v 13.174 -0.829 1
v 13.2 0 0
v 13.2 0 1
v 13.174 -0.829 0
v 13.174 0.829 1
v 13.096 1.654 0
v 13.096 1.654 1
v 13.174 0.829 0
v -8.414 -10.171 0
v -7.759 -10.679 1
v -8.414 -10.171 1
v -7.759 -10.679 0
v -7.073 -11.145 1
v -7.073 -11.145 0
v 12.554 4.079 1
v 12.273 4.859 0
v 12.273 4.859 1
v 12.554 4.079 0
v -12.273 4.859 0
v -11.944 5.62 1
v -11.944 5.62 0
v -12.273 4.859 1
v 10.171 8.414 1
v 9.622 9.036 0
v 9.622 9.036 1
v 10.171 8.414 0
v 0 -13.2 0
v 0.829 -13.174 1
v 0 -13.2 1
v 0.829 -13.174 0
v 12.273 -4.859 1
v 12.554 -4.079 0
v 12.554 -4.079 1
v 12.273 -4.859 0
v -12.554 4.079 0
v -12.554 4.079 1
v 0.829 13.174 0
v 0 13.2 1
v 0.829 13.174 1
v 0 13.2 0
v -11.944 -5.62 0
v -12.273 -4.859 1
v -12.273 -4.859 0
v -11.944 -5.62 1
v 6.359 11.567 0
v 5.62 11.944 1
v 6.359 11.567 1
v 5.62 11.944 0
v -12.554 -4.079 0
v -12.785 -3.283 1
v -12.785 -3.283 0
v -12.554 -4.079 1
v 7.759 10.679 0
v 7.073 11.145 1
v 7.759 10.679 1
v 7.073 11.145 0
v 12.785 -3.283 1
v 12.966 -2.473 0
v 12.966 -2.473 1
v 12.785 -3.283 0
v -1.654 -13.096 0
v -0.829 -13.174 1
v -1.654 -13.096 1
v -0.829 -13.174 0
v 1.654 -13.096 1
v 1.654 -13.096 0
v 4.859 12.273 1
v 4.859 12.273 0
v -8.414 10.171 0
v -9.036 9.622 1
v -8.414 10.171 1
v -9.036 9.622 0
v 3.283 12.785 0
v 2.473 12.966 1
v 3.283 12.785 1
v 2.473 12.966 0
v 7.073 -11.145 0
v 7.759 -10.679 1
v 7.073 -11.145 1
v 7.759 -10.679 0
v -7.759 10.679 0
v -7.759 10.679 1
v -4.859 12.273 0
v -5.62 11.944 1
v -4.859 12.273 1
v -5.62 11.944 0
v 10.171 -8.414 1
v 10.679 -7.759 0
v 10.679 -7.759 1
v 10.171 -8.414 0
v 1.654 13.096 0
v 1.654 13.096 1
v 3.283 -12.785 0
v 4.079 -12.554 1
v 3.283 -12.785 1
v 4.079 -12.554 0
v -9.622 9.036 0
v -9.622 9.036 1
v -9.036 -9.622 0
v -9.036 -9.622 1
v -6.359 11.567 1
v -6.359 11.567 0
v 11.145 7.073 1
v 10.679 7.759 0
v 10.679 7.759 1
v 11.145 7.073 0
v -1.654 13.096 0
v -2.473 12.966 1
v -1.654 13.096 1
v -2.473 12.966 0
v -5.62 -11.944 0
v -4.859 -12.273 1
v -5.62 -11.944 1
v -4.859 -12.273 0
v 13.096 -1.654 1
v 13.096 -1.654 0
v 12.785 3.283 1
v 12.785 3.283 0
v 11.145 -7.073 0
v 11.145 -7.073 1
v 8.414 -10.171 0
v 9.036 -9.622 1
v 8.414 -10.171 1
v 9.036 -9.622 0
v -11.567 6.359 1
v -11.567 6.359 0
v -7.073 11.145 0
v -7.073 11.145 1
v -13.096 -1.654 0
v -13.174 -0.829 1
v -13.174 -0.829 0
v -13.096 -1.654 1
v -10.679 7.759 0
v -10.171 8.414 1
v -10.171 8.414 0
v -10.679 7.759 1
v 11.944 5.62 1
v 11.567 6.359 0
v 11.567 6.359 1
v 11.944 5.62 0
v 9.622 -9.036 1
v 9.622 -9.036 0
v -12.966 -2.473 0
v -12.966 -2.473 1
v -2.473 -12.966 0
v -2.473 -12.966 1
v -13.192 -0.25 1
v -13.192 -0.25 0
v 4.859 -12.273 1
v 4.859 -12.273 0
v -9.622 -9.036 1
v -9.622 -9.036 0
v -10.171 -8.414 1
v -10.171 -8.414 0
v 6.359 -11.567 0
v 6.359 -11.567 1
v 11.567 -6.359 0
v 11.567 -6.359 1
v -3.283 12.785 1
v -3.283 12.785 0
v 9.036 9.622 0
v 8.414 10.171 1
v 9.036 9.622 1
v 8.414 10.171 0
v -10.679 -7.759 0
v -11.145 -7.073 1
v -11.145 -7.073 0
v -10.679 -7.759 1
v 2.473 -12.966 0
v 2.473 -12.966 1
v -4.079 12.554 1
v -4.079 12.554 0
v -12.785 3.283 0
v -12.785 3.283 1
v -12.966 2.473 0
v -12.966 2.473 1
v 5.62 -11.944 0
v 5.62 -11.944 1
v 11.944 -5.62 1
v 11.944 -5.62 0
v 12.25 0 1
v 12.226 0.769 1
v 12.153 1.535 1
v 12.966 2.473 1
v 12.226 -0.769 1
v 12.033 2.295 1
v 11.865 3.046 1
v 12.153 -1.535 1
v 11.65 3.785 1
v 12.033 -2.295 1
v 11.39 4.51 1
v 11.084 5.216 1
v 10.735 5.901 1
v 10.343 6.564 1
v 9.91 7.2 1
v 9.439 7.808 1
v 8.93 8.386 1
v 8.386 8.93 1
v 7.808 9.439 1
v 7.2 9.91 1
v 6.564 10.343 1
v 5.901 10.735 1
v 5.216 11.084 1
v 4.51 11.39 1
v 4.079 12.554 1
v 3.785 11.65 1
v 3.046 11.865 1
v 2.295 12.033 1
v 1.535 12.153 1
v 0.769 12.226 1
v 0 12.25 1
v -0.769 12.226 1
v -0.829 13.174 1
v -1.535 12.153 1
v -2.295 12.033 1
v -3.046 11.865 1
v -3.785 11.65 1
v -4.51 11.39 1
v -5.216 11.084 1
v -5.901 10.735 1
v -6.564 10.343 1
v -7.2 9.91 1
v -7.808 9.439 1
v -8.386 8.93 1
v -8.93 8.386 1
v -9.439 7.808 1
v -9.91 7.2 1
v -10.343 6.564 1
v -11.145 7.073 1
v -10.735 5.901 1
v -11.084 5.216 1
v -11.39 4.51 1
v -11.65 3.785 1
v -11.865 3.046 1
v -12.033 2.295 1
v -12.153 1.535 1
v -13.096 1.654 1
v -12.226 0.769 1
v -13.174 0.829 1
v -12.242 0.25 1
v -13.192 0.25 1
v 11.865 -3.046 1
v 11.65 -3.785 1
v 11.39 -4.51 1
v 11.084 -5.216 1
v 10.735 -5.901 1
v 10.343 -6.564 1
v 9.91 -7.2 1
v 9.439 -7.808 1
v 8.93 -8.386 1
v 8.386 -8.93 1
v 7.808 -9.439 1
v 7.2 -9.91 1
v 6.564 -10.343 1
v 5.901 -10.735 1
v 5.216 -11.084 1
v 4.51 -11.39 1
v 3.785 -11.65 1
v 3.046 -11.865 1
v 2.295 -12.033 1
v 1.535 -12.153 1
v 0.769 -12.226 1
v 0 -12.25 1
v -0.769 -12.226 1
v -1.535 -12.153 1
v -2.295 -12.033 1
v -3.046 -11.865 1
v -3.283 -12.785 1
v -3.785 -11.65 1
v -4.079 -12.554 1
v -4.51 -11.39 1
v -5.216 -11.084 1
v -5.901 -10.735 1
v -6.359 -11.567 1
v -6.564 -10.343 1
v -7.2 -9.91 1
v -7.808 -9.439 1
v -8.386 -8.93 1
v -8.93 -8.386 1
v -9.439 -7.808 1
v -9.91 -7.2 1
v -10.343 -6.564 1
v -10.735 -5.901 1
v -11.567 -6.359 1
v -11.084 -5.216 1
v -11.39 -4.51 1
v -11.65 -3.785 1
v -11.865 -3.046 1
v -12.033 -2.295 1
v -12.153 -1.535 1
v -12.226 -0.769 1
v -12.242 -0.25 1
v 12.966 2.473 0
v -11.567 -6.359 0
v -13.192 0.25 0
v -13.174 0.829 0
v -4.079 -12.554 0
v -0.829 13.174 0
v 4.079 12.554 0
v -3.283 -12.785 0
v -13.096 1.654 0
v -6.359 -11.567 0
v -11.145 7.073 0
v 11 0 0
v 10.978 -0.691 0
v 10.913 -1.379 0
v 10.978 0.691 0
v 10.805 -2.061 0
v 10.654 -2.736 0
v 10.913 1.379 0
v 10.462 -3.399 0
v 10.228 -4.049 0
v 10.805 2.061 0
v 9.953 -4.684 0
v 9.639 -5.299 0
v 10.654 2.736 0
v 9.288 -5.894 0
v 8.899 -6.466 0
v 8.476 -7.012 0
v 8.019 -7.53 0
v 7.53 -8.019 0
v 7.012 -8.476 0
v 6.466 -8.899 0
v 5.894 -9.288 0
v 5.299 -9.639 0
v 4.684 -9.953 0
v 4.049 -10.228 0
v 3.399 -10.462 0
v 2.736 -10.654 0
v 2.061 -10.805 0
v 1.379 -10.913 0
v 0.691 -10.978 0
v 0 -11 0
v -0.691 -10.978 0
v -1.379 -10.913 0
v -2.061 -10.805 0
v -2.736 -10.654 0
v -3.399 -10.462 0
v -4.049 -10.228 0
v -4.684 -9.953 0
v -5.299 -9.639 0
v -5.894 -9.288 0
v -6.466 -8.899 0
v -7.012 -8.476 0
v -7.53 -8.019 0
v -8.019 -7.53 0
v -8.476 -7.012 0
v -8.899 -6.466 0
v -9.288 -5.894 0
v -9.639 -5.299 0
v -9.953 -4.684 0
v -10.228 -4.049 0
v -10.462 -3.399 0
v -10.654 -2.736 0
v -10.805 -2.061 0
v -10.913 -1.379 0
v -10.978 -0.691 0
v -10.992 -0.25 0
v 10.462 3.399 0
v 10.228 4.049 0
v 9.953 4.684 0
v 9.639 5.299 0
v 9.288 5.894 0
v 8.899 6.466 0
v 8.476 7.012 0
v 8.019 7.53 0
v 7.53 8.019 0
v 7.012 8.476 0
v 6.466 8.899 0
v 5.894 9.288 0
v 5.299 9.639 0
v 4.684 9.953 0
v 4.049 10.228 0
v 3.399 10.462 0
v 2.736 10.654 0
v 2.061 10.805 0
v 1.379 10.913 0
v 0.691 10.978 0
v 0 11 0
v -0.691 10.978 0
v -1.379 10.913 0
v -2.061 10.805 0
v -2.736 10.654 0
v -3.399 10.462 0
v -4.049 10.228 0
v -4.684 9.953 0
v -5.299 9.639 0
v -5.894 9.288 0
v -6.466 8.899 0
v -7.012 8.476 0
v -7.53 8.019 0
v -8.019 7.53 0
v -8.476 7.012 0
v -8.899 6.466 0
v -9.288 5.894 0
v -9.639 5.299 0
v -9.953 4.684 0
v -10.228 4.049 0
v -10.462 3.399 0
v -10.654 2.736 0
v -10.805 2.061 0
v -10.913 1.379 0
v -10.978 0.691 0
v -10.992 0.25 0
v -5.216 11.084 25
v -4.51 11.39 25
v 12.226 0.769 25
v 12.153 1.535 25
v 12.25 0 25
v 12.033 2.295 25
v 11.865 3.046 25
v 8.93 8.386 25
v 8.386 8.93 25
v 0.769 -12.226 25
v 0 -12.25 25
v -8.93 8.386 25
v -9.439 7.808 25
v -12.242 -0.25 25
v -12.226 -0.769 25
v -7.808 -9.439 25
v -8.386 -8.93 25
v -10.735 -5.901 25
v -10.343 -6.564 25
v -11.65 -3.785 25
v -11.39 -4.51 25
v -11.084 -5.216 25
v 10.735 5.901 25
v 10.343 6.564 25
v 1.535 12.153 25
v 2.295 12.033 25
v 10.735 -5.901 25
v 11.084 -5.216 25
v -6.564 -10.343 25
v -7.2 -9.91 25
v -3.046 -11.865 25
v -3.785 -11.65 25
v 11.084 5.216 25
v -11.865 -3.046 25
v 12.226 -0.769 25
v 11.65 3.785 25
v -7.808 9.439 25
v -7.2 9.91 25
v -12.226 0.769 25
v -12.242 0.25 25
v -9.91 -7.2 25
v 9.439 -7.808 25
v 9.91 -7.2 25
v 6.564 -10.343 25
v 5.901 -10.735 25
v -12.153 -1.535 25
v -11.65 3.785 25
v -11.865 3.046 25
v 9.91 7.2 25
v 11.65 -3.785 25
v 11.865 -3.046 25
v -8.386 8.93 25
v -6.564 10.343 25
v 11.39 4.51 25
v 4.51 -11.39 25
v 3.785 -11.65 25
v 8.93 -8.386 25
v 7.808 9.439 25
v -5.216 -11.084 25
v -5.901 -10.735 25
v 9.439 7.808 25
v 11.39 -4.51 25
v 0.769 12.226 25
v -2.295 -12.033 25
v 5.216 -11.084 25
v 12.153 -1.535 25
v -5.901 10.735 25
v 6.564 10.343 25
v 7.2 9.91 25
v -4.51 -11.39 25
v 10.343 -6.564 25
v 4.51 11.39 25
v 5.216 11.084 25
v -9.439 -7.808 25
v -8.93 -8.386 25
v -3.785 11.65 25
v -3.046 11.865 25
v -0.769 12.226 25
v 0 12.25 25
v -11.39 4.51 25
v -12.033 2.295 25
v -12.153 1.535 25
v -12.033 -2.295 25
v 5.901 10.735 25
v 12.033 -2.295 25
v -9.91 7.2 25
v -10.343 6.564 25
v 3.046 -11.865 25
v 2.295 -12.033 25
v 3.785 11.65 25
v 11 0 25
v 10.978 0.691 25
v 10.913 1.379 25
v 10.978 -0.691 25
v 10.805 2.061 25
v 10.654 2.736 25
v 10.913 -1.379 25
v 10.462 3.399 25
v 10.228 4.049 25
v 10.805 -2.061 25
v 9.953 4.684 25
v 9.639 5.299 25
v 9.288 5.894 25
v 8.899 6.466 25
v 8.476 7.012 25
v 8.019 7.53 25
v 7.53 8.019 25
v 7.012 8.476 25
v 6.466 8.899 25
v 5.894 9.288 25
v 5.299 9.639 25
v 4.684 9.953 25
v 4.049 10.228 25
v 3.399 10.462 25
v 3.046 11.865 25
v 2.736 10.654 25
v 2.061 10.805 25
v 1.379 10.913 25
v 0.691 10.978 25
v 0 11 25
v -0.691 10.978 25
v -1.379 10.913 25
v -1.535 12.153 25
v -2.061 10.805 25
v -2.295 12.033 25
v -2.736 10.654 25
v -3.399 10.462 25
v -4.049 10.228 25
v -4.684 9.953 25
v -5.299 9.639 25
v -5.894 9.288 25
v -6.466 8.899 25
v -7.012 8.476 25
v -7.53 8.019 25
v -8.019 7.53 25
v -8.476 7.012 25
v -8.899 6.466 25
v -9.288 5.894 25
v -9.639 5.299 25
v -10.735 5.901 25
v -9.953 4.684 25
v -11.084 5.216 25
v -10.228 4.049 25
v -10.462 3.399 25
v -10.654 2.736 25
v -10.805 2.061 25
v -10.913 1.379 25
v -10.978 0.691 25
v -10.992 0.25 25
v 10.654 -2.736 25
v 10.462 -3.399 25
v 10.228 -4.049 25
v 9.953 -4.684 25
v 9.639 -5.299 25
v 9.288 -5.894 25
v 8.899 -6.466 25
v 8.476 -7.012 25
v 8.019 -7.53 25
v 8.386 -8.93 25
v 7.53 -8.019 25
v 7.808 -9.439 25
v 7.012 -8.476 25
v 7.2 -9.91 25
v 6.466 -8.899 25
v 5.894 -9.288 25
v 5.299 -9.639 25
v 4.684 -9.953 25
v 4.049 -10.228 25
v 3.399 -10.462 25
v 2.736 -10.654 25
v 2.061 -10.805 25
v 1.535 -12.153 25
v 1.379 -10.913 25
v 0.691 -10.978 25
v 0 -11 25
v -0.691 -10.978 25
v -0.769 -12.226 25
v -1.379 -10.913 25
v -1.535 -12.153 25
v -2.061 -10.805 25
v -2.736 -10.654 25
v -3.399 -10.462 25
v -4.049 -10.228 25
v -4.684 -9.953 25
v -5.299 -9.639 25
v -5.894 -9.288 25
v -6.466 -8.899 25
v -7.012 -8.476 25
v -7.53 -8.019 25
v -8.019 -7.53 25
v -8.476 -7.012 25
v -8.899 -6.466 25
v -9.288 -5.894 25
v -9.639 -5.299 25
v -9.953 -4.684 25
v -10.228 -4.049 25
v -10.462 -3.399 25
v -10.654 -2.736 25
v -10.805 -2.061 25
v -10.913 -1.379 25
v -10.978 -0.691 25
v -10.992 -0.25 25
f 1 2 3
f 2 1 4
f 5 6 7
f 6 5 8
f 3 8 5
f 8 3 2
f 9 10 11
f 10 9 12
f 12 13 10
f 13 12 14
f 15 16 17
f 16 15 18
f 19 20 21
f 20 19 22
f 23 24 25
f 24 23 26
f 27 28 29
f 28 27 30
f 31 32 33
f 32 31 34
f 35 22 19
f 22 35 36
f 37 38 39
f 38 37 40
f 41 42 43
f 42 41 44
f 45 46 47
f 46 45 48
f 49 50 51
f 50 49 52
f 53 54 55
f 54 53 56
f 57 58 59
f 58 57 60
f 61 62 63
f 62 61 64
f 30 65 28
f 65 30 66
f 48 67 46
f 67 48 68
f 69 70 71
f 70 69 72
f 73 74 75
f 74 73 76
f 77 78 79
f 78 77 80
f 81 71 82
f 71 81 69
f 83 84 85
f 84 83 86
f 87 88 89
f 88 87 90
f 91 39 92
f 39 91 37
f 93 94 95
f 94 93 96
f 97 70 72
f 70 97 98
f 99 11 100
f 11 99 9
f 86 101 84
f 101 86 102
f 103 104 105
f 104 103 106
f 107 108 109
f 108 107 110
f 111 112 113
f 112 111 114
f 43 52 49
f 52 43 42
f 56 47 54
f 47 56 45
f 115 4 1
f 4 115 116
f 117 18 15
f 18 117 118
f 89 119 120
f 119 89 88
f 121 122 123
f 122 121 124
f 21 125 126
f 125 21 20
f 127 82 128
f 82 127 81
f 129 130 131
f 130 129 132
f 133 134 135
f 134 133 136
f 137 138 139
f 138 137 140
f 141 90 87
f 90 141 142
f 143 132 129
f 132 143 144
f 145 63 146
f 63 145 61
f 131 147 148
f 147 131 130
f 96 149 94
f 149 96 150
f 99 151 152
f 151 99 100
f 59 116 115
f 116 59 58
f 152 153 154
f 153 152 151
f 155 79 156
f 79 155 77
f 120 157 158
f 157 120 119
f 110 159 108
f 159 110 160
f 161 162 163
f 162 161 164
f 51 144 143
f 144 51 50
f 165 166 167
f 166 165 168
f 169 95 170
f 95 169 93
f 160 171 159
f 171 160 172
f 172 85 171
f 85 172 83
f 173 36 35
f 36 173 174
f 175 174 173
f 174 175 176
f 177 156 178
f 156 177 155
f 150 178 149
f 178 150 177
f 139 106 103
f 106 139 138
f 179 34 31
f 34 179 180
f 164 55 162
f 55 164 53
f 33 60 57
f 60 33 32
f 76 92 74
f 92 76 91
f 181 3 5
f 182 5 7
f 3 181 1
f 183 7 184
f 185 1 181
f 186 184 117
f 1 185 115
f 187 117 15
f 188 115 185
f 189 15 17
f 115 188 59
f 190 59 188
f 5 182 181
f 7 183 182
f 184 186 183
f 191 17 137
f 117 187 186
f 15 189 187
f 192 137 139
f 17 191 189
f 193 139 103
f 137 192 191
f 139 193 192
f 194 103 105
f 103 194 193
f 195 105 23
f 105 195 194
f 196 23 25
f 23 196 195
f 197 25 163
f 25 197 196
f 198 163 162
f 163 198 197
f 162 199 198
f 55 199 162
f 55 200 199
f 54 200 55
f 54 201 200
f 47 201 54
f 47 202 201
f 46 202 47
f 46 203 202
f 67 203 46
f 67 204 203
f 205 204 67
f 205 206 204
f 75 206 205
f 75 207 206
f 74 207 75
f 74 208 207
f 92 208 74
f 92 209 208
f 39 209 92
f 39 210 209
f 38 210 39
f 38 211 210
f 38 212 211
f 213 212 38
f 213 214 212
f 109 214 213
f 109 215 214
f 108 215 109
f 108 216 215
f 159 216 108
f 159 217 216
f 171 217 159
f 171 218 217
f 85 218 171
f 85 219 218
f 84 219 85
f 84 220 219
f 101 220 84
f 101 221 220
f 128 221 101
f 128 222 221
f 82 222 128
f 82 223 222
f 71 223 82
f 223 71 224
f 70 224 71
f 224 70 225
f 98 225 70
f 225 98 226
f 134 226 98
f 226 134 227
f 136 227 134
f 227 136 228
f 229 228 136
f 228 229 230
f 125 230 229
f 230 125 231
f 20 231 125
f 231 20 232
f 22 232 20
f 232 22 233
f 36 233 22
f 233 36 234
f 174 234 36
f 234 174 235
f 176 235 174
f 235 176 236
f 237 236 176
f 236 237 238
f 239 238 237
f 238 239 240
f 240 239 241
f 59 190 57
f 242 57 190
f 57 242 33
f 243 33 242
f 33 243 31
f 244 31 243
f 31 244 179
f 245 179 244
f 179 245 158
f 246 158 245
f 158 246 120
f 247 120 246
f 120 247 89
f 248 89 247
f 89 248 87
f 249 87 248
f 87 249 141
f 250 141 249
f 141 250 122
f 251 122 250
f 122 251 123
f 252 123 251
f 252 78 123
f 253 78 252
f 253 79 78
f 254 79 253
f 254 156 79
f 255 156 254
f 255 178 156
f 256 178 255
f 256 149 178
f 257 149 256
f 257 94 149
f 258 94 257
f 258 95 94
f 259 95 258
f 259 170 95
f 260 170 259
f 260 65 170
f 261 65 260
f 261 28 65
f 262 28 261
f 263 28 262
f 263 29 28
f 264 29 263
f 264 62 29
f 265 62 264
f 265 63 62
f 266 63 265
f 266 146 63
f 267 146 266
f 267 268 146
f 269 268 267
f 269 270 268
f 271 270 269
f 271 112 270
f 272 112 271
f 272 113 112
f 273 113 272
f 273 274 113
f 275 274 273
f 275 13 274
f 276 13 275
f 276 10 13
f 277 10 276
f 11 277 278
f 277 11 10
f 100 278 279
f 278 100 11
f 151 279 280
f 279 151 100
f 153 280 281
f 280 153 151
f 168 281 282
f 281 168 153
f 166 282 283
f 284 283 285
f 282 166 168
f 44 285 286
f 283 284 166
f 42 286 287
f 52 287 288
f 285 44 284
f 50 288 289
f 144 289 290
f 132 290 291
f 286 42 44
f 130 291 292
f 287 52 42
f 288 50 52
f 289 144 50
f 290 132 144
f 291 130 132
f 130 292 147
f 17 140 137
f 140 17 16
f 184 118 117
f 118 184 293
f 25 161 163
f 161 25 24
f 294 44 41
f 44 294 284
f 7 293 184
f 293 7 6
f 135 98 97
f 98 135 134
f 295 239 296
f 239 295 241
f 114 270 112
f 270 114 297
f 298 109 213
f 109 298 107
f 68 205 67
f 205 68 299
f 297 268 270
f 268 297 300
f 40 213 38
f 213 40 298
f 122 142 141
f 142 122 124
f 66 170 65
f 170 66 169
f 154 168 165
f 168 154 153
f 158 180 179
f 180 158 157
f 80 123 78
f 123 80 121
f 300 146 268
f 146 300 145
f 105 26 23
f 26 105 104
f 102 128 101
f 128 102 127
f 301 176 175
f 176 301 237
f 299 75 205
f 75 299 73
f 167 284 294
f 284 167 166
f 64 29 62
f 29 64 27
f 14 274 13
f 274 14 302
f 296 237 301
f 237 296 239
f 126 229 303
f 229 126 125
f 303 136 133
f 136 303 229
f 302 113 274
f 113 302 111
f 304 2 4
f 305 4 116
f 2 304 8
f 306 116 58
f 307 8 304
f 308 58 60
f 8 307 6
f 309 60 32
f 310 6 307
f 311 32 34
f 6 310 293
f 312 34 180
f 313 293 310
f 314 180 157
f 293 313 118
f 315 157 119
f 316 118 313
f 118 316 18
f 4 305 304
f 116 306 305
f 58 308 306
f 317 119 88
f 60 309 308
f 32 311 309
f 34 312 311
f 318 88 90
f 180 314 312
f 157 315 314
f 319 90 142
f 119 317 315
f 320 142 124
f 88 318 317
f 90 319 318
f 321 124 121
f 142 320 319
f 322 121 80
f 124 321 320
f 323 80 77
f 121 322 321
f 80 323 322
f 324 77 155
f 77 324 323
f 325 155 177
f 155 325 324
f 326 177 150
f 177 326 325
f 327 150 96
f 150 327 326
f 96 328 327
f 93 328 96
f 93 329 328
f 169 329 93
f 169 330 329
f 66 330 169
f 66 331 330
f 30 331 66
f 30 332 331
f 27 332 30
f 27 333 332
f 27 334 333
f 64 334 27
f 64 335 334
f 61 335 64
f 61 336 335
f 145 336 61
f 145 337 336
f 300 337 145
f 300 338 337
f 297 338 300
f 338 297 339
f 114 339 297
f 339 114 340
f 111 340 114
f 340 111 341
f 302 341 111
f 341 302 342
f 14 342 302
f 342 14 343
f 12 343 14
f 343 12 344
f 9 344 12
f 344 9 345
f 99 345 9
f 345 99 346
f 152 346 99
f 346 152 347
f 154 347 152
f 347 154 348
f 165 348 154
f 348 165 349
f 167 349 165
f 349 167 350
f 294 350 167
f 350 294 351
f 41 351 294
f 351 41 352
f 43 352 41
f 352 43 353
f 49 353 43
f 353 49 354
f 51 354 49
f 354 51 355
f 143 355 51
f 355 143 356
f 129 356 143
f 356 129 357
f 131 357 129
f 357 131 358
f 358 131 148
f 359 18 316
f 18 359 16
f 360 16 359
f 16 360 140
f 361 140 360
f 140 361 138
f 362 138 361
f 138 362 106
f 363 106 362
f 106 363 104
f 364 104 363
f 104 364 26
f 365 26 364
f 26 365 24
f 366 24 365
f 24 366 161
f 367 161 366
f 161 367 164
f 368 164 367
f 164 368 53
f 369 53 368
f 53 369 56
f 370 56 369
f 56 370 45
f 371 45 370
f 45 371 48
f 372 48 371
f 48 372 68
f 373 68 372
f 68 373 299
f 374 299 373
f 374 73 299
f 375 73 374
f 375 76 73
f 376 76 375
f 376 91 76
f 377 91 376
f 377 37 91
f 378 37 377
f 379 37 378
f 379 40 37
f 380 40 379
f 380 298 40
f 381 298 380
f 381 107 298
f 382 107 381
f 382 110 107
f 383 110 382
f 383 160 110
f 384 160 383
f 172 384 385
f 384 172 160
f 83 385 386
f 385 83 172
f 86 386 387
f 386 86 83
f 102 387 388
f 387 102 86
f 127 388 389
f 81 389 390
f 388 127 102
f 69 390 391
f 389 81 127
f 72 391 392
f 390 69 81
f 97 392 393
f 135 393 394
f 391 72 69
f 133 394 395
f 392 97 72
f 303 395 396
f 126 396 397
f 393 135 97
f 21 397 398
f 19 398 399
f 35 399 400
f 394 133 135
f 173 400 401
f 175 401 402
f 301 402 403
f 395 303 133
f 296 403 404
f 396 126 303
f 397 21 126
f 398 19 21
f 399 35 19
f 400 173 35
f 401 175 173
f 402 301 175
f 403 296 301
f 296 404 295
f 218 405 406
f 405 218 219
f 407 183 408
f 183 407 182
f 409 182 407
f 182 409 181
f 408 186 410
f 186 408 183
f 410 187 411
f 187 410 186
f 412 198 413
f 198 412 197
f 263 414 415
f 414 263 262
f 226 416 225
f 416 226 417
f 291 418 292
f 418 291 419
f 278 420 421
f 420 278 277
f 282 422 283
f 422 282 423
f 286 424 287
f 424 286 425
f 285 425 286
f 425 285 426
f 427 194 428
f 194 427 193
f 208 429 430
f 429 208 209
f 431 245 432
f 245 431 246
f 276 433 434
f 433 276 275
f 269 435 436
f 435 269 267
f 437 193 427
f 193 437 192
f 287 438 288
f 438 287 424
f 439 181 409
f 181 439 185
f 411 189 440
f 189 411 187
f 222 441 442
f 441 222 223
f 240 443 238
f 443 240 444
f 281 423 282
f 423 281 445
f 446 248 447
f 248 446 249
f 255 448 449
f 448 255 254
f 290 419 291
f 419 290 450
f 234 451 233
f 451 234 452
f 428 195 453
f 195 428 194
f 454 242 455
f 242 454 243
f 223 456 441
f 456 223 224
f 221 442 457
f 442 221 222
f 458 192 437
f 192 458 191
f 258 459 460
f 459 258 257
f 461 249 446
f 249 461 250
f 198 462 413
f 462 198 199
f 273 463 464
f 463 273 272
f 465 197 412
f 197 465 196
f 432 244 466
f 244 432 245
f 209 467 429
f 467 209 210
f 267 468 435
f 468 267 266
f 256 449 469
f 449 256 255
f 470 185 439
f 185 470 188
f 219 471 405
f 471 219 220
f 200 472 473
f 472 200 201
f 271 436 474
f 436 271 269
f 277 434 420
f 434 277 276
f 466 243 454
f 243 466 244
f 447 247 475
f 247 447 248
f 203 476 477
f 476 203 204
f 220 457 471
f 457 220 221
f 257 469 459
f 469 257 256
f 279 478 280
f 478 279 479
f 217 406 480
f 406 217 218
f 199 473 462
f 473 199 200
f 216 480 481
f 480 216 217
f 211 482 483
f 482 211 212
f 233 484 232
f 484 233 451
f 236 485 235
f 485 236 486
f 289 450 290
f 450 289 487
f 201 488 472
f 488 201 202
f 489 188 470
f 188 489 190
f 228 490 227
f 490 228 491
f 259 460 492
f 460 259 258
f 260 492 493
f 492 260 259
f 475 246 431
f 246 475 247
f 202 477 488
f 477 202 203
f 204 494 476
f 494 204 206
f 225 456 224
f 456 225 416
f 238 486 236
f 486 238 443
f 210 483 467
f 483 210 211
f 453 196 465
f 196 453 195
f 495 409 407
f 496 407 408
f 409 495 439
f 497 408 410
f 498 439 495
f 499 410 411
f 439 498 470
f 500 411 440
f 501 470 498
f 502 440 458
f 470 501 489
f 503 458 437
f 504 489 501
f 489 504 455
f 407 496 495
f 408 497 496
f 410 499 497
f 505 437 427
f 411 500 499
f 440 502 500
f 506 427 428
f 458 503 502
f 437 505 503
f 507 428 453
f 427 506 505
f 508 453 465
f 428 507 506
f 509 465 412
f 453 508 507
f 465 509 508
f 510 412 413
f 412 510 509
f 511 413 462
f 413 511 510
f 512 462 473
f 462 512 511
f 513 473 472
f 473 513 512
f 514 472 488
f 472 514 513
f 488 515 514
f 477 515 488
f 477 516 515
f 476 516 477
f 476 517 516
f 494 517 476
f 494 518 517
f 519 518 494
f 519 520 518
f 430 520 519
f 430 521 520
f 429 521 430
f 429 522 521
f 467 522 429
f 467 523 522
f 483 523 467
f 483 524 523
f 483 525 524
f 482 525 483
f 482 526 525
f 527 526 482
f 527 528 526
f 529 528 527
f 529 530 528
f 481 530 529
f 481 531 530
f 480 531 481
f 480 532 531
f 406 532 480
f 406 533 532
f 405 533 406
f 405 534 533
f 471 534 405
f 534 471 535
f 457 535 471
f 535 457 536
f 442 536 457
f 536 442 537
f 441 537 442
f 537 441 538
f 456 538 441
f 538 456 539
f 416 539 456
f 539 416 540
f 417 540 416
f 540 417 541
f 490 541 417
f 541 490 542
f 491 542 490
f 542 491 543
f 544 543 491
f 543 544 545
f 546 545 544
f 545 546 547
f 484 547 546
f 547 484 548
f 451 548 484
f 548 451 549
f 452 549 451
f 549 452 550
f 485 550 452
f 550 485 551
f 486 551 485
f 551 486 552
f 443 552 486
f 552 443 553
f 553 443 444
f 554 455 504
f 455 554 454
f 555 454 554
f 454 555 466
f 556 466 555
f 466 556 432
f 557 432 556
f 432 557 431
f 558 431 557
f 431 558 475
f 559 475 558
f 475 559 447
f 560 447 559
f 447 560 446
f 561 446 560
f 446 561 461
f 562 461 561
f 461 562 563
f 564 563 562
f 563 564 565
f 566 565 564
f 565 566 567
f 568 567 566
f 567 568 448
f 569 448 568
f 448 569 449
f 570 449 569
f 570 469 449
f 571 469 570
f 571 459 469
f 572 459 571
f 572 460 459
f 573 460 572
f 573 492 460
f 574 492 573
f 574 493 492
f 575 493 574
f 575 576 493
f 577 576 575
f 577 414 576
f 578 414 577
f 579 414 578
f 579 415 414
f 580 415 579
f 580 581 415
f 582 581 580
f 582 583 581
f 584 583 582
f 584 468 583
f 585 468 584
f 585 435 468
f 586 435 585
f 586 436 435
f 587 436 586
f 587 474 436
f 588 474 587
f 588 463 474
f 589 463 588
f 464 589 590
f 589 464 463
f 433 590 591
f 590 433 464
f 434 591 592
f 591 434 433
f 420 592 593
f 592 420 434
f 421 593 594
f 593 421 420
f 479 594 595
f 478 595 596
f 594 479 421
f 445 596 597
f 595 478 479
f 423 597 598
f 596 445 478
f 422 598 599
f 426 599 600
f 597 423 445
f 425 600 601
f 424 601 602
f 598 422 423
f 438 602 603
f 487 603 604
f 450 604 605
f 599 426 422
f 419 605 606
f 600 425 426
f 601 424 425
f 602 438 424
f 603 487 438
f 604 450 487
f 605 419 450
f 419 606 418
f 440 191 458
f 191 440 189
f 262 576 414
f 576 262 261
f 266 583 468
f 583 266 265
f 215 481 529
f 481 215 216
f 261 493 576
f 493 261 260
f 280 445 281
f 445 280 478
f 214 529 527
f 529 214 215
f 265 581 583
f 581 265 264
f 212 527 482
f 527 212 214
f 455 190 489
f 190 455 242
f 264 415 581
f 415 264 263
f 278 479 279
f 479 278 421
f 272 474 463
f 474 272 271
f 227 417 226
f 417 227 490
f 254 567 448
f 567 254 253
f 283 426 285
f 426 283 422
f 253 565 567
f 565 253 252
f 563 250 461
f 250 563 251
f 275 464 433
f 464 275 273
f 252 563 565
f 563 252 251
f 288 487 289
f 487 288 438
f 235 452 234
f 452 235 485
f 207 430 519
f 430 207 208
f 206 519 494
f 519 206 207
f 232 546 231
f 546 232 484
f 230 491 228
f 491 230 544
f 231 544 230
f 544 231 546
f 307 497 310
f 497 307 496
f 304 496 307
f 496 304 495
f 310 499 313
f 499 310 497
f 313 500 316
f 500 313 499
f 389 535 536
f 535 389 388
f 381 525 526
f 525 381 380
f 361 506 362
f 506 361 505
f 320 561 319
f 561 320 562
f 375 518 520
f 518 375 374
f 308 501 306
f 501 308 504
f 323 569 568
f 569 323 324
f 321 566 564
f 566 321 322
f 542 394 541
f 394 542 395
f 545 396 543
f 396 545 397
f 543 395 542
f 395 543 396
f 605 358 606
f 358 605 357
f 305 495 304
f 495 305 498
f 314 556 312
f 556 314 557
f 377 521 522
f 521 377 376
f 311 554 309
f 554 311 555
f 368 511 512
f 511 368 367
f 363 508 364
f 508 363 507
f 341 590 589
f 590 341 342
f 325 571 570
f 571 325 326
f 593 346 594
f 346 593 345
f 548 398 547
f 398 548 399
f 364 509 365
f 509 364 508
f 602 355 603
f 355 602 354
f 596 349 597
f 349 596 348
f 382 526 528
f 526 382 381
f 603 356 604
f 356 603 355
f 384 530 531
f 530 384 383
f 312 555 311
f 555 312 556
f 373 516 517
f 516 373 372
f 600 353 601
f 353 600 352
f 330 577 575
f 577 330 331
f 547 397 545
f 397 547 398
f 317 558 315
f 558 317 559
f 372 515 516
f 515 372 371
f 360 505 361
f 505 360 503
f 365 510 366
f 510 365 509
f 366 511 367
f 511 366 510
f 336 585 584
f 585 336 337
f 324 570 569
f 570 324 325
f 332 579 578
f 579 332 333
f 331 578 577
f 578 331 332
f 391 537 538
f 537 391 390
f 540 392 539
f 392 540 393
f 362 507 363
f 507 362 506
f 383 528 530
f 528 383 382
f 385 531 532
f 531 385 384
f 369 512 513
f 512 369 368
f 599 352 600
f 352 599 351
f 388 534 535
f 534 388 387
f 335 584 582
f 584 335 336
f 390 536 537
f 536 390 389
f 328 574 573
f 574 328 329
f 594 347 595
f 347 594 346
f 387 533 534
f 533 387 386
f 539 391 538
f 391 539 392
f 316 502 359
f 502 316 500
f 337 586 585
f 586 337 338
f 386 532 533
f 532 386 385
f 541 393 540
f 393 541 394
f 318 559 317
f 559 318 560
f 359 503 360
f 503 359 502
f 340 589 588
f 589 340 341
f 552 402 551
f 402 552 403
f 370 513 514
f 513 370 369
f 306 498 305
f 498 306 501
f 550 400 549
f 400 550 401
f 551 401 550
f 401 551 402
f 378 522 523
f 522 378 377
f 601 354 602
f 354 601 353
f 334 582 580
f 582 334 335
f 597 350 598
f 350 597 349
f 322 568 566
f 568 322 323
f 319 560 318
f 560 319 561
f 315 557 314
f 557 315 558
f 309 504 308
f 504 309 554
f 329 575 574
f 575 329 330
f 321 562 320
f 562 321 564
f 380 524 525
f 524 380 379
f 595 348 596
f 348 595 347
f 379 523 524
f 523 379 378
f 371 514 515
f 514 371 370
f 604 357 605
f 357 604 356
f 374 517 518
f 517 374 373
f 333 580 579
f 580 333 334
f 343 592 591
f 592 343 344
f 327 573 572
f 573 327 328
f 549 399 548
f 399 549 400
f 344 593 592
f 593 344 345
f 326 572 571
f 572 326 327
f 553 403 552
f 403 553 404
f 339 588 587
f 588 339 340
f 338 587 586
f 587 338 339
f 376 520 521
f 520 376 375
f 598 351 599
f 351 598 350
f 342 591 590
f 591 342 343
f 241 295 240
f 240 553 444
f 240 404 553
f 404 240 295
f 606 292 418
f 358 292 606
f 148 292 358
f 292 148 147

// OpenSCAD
$fn = 100; 

module porsche()
{
  difference()
  {
    union()
    {
      cylinder(h=1, r=13.2, center=false);
      cylinder(h=25, r=12.25, center=false);
    }
    translate([0,0,-1])
      cylinder(h=32, r=11, center=false);
    
    translate([-14,-0.25,-0.5])
      cube([8,0.5,33]);
  }
  
  
}

porsche();
